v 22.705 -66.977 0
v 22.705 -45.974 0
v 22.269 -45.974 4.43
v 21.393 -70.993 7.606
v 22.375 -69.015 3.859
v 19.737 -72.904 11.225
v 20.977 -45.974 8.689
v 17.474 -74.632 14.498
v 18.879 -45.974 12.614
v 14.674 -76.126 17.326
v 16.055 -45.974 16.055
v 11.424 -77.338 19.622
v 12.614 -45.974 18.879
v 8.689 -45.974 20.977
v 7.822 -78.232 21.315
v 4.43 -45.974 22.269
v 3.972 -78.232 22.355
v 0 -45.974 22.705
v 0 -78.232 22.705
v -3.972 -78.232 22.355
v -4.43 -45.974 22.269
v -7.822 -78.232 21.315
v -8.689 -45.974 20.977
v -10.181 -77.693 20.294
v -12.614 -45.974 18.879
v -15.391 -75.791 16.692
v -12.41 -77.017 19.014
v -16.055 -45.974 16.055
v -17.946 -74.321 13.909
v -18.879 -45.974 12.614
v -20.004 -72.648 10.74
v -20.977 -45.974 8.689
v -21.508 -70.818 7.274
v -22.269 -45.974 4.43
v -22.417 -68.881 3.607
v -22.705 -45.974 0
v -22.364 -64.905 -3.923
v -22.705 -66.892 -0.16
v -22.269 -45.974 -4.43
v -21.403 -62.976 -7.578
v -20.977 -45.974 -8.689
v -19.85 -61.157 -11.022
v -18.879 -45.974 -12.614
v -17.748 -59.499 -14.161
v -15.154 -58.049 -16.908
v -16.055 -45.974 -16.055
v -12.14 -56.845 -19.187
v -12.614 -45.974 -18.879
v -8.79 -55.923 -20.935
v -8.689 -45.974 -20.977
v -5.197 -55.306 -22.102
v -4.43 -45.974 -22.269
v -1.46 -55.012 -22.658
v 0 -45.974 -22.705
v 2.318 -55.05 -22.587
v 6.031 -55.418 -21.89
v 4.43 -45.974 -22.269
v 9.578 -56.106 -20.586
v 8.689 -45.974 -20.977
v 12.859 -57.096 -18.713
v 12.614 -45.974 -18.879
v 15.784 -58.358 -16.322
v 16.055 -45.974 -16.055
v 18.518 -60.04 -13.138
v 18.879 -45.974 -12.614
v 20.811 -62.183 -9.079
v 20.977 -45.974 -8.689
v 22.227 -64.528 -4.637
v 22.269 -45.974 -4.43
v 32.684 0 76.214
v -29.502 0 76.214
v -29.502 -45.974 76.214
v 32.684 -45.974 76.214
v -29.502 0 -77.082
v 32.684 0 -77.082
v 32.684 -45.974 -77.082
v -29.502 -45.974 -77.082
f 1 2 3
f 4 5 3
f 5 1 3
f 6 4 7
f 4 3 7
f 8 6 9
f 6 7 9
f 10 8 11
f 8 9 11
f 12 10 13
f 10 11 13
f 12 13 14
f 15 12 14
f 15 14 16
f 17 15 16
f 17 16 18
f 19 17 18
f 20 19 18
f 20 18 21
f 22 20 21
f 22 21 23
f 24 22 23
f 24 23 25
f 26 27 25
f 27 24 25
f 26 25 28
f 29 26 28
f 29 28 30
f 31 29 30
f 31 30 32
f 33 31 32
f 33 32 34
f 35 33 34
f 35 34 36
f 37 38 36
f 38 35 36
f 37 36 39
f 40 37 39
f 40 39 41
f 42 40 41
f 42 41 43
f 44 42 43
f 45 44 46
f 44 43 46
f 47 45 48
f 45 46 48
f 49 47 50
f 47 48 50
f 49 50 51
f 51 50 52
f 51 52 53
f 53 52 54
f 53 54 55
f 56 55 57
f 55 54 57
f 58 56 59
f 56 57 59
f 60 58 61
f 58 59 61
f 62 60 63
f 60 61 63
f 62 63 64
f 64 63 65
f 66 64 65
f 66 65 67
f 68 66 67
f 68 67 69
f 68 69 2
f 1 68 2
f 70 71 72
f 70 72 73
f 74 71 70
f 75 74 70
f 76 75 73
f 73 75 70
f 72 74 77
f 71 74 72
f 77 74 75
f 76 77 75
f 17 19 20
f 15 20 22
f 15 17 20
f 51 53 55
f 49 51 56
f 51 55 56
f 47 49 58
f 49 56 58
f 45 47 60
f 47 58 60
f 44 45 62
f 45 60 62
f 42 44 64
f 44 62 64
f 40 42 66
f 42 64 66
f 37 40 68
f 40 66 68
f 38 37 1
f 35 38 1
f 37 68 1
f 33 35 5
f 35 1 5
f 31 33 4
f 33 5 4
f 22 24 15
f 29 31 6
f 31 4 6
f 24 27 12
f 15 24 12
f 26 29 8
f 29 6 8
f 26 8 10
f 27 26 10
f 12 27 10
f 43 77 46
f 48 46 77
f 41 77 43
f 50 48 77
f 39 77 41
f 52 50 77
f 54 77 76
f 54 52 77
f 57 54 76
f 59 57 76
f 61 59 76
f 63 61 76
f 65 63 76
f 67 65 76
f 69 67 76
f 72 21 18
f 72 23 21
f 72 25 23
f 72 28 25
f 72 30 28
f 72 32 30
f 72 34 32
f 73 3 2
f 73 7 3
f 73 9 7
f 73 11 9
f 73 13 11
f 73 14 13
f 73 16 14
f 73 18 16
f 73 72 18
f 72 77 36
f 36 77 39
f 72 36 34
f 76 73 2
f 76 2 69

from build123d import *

# Parameters (mm, degrees)
F0_W     = 62.186198
F0_H     = 153.296209
F1_DEPTH = 45.974
F2_R     = 22.70519
F3_DEPTH = 32.258
F5_DEPTH = 24.384


with BuildPart() as f1:
    # F0 (on Front) → F1 (new body)
    with BuildSketch(Plane.XZ):
        with Locations((1.59081, -0.433858)):
            Rectangle(F0_W, F0_H)
    extrude(amount=F1_DEPTH)

    # F2 (on face) → F3 (join)
    with BuildSketch(Plane.XZ.offset(45.974)):
        Circle(F2_R)
    extrude(amount=F3_DEPTH)

    # F4 (on Right) → F5 (cut, symmetric)
    with BuildSketch(Plane.YZ):
        Polygon((-53.611651, -25.310941), (-78.850865, 22.487216), (-78.627512, -25.310941), align=None)
    extrude(amount=F5_DEPTH, both=True, mode=Mode.SUBTRACT)


solid = f1.part
